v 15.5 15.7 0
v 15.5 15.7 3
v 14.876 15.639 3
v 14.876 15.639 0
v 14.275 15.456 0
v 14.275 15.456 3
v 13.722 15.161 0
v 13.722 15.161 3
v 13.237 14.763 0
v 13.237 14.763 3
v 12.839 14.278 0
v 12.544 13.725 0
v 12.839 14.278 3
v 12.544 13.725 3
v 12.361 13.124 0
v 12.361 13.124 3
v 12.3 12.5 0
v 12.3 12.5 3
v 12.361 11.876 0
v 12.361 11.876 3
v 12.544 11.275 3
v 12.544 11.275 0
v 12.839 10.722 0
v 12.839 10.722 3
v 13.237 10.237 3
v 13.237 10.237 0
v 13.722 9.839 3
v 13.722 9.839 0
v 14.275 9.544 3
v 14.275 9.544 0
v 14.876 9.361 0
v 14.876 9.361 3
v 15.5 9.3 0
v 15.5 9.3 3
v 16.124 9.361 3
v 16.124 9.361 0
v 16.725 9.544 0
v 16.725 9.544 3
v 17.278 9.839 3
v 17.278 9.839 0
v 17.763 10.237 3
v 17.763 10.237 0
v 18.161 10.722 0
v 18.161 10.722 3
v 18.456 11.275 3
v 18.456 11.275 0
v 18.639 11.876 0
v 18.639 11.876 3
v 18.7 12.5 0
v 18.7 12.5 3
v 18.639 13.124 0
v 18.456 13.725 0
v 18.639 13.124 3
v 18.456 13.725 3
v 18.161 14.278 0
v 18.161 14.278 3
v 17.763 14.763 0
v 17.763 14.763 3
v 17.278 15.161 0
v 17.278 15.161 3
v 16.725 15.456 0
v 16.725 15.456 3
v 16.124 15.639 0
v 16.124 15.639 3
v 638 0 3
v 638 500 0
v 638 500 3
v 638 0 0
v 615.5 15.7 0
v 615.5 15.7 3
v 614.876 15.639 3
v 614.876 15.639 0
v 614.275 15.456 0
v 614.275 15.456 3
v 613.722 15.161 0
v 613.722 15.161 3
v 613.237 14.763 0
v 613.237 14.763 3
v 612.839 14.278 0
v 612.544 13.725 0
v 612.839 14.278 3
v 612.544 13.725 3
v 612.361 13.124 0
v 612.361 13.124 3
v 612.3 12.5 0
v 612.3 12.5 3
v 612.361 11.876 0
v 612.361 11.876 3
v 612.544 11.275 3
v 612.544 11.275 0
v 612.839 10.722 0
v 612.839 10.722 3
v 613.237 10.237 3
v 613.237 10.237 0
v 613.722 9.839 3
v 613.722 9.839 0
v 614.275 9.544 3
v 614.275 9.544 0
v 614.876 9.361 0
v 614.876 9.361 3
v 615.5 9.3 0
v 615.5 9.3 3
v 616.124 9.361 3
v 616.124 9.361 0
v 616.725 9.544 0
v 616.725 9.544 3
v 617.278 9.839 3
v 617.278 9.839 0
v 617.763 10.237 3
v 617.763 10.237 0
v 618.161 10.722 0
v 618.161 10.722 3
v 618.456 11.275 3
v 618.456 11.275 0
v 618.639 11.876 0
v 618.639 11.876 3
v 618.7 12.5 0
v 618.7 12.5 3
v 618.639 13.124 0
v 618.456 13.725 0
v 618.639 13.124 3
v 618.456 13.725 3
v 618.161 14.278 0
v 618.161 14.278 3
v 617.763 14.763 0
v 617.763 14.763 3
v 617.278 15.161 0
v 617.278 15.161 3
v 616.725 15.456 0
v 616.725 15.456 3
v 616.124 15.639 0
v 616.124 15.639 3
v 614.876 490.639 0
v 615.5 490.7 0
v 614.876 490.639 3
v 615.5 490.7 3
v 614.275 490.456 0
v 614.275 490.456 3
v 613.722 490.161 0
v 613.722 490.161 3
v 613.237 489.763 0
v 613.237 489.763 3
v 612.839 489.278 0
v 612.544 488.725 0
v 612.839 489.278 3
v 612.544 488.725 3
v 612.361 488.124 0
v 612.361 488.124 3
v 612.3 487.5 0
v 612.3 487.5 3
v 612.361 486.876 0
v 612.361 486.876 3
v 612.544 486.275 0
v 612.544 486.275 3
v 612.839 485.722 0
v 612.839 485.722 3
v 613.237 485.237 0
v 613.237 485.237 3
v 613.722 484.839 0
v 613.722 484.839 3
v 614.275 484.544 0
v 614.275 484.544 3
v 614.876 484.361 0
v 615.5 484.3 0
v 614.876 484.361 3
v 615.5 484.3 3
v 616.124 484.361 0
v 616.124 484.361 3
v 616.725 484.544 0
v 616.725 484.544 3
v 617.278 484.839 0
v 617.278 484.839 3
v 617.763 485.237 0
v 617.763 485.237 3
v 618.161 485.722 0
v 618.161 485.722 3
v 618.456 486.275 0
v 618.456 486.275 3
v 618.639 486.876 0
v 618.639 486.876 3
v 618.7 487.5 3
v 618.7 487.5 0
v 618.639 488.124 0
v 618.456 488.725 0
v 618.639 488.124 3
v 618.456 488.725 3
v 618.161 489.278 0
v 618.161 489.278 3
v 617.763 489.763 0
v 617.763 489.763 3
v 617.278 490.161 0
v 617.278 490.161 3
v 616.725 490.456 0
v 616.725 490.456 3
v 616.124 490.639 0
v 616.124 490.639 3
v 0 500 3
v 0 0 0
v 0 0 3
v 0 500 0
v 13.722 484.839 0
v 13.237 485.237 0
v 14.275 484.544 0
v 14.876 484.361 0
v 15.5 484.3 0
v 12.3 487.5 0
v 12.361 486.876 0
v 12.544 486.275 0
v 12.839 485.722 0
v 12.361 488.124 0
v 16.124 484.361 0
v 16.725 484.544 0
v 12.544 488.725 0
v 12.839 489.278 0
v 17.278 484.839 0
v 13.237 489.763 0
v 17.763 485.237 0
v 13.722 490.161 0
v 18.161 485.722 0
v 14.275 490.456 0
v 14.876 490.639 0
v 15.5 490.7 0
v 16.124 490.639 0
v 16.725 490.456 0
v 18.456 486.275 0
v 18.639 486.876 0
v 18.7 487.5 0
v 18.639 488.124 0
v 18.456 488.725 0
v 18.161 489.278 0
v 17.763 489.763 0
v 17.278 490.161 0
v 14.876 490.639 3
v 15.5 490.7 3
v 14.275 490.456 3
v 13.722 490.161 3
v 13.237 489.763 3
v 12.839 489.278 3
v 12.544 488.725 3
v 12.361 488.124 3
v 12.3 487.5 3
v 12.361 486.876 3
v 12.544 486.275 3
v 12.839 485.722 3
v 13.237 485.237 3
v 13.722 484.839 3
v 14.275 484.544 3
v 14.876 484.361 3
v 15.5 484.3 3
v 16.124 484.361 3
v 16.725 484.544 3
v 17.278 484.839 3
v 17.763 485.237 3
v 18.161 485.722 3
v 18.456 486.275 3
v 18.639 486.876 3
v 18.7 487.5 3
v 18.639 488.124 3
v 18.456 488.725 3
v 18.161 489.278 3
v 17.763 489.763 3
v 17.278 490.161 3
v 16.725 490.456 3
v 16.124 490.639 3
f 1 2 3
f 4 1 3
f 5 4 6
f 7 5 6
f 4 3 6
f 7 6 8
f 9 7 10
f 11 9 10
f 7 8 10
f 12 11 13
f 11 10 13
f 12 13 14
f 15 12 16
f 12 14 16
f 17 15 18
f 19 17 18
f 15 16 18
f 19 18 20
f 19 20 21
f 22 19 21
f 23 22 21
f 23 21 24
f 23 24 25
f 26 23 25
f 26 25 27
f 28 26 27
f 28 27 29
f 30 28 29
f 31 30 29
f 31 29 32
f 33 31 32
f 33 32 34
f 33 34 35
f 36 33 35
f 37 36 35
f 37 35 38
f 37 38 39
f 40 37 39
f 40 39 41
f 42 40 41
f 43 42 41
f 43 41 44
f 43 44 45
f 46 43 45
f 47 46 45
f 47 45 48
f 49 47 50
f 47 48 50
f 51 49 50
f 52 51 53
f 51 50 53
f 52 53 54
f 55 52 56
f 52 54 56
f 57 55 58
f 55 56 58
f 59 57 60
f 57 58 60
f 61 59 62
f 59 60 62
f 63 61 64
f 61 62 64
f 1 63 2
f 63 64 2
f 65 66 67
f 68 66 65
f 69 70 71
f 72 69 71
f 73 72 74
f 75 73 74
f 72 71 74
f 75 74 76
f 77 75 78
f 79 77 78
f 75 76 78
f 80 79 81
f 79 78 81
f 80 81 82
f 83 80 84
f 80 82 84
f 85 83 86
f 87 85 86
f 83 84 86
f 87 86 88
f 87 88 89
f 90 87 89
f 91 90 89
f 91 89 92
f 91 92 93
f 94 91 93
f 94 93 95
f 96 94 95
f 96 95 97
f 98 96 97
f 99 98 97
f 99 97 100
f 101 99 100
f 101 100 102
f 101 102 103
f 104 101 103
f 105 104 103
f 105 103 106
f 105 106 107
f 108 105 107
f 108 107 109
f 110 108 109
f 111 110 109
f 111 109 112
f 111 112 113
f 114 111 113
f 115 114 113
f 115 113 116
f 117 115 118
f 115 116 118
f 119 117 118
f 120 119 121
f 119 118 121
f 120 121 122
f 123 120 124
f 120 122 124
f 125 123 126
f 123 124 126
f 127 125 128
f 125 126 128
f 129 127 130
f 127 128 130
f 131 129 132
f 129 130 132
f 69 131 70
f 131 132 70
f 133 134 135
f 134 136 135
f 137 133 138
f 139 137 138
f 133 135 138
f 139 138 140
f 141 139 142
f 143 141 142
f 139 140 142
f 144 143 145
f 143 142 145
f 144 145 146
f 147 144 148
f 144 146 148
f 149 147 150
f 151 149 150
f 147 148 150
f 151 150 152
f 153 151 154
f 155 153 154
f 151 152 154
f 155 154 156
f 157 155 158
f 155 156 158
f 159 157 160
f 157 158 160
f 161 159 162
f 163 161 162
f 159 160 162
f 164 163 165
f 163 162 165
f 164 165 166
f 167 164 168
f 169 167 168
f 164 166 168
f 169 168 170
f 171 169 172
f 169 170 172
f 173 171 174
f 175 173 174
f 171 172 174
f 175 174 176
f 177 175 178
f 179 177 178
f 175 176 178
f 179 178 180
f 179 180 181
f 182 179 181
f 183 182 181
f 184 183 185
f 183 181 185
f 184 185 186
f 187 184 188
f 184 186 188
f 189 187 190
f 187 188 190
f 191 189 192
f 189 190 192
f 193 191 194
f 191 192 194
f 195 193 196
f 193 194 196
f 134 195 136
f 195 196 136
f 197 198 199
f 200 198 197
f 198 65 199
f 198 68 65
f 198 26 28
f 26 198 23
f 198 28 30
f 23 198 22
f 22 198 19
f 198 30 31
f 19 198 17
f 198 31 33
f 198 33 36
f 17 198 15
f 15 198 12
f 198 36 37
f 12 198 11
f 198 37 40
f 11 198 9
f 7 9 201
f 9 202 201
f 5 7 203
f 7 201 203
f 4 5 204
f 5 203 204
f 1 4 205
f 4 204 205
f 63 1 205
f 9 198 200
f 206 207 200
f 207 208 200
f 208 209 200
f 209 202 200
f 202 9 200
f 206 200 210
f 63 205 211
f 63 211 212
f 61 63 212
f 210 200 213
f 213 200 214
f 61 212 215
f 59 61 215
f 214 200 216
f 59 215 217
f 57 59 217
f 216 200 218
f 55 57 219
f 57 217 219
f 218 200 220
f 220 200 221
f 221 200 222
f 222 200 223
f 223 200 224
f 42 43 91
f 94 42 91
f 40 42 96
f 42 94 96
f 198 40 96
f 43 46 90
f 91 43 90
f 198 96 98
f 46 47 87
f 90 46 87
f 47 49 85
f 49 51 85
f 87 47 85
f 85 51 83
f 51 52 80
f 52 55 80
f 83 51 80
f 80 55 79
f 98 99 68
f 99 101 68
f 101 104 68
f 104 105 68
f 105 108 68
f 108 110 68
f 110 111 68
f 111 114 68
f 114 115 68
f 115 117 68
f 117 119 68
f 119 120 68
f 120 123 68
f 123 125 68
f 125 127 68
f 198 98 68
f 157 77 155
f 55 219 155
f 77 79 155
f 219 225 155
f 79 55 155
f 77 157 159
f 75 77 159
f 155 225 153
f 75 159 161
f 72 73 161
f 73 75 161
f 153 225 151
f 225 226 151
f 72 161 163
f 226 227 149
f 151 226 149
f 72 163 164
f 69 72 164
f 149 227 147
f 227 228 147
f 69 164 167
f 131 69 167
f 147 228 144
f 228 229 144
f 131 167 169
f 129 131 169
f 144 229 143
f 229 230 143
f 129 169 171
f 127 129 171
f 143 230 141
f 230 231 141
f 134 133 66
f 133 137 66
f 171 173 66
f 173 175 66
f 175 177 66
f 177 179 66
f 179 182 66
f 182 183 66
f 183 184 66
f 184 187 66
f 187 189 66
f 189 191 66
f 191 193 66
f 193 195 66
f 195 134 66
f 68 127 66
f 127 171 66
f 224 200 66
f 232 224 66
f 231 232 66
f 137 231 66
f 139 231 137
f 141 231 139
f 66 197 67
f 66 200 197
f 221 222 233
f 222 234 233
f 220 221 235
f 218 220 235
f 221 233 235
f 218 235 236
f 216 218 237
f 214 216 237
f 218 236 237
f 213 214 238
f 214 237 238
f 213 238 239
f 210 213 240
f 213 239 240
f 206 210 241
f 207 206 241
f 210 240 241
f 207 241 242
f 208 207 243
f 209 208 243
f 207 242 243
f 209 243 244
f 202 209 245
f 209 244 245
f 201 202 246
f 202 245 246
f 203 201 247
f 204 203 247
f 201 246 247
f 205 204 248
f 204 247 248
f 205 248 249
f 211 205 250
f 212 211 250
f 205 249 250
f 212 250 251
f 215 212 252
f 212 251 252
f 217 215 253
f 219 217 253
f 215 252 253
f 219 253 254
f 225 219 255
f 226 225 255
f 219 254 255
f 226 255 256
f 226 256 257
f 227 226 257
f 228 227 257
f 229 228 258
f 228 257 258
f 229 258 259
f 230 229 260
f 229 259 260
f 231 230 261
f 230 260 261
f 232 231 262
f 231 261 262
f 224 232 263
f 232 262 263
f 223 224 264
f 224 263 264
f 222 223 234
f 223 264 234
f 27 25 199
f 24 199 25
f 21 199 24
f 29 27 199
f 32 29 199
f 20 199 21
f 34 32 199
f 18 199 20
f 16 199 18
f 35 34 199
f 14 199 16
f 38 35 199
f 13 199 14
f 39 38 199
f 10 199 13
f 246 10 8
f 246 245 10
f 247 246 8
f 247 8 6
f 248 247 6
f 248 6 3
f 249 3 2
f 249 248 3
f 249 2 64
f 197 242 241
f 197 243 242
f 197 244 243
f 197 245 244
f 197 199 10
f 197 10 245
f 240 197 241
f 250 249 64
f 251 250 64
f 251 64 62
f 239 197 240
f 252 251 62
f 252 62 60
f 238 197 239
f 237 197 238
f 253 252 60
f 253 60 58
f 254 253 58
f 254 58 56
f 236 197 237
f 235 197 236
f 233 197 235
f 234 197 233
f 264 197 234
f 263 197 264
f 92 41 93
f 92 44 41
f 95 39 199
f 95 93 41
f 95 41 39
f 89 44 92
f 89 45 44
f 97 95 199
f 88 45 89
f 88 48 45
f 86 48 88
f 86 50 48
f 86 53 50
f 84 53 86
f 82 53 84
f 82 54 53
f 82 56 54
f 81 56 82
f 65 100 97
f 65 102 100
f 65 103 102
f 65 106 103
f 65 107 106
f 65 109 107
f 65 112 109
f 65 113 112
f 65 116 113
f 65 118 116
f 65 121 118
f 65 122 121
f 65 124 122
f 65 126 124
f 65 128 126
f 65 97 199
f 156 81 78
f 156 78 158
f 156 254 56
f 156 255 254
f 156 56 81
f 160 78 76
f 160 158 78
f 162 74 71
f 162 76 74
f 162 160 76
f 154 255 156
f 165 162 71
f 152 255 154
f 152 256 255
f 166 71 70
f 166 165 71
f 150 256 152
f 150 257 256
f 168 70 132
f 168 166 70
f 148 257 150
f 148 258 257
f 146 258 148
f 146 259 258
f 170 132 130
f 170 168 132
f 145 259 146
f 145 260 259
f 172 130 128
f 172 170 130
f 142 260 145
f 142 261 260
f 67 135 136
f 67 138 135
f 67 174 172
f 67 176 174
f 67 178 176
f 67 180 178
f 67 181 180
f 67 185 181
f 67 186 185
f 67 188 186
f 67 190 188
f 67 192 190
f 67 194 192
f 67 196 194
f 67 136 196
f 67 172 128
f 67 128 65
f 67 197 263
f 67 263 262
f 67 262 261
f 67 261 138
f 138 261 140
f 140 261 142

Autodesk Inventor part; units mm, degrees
ref_plane "YZ Plane" through (0, 0, 0) normal (1, 0, 0) x (0, 1, 0)
ref_plane "XZ Plane" through (0, 0, 0) normal (0, 1, 0) x (-1, 0, 0)
ref_plane "XY Plane" through (0, 0, 0) normal (0, 0, 1) x (1, 0, 0)
sketch "Sketch1" plane through (0, 0, 0) normal (0, 0, 1) x (1, 0, 0)
  line L0 (638, 0) -> (0, 0)
  line L1 (0, 0) -> (0, 500)
  line L2 (0, 500) -> (638, 500)
  line L3 (638, 500) -> (638, 0)
  line L4 (615.5, 493.1922) -> (615.5, 30.4656) construction
  line L5 (15.5, 487.5) -> (15.5, 12.5) construction
  line L6 (638, 500) -> (615.5, 500)
  line L7 (638, 460) -> (638, 500)
  line L8 (638, 0) -> (615.5, 0)
  line L9 (638, 40) -> (638, 0)
  line L10 (638, 500) -> (628, 500)
  line L11 (638, 460) -> (638, 500)
  line L12 (638, 0) -> (628, 0)
  line L13 (638, 40) -> (638, 0)
  point P0 (615.5, 12.5)
  point P1 (615.5, 487.5)
  dimension "d2" = 638
  dimension "d3" = 500
  dimension "d10" = 22.5
  dimension "d11" = 15.5
  dimension "d12" = 12.5
  dimension "d13" = 12.5
  dimension "d14" = 12.5
  dimension "d15" = 12.5
extrude "Extrusion1" add sketch "Sketch1" along normal blind 3
hole "Hole1" at (615.5, 12.5, 0) at (615.5, 487.5, 0) at (15.5, 487.5, 0) at (15.5, 12.5, 0) direction (0, 0, 1) diameter 6.4 end through all
properties part number "left_wall"
